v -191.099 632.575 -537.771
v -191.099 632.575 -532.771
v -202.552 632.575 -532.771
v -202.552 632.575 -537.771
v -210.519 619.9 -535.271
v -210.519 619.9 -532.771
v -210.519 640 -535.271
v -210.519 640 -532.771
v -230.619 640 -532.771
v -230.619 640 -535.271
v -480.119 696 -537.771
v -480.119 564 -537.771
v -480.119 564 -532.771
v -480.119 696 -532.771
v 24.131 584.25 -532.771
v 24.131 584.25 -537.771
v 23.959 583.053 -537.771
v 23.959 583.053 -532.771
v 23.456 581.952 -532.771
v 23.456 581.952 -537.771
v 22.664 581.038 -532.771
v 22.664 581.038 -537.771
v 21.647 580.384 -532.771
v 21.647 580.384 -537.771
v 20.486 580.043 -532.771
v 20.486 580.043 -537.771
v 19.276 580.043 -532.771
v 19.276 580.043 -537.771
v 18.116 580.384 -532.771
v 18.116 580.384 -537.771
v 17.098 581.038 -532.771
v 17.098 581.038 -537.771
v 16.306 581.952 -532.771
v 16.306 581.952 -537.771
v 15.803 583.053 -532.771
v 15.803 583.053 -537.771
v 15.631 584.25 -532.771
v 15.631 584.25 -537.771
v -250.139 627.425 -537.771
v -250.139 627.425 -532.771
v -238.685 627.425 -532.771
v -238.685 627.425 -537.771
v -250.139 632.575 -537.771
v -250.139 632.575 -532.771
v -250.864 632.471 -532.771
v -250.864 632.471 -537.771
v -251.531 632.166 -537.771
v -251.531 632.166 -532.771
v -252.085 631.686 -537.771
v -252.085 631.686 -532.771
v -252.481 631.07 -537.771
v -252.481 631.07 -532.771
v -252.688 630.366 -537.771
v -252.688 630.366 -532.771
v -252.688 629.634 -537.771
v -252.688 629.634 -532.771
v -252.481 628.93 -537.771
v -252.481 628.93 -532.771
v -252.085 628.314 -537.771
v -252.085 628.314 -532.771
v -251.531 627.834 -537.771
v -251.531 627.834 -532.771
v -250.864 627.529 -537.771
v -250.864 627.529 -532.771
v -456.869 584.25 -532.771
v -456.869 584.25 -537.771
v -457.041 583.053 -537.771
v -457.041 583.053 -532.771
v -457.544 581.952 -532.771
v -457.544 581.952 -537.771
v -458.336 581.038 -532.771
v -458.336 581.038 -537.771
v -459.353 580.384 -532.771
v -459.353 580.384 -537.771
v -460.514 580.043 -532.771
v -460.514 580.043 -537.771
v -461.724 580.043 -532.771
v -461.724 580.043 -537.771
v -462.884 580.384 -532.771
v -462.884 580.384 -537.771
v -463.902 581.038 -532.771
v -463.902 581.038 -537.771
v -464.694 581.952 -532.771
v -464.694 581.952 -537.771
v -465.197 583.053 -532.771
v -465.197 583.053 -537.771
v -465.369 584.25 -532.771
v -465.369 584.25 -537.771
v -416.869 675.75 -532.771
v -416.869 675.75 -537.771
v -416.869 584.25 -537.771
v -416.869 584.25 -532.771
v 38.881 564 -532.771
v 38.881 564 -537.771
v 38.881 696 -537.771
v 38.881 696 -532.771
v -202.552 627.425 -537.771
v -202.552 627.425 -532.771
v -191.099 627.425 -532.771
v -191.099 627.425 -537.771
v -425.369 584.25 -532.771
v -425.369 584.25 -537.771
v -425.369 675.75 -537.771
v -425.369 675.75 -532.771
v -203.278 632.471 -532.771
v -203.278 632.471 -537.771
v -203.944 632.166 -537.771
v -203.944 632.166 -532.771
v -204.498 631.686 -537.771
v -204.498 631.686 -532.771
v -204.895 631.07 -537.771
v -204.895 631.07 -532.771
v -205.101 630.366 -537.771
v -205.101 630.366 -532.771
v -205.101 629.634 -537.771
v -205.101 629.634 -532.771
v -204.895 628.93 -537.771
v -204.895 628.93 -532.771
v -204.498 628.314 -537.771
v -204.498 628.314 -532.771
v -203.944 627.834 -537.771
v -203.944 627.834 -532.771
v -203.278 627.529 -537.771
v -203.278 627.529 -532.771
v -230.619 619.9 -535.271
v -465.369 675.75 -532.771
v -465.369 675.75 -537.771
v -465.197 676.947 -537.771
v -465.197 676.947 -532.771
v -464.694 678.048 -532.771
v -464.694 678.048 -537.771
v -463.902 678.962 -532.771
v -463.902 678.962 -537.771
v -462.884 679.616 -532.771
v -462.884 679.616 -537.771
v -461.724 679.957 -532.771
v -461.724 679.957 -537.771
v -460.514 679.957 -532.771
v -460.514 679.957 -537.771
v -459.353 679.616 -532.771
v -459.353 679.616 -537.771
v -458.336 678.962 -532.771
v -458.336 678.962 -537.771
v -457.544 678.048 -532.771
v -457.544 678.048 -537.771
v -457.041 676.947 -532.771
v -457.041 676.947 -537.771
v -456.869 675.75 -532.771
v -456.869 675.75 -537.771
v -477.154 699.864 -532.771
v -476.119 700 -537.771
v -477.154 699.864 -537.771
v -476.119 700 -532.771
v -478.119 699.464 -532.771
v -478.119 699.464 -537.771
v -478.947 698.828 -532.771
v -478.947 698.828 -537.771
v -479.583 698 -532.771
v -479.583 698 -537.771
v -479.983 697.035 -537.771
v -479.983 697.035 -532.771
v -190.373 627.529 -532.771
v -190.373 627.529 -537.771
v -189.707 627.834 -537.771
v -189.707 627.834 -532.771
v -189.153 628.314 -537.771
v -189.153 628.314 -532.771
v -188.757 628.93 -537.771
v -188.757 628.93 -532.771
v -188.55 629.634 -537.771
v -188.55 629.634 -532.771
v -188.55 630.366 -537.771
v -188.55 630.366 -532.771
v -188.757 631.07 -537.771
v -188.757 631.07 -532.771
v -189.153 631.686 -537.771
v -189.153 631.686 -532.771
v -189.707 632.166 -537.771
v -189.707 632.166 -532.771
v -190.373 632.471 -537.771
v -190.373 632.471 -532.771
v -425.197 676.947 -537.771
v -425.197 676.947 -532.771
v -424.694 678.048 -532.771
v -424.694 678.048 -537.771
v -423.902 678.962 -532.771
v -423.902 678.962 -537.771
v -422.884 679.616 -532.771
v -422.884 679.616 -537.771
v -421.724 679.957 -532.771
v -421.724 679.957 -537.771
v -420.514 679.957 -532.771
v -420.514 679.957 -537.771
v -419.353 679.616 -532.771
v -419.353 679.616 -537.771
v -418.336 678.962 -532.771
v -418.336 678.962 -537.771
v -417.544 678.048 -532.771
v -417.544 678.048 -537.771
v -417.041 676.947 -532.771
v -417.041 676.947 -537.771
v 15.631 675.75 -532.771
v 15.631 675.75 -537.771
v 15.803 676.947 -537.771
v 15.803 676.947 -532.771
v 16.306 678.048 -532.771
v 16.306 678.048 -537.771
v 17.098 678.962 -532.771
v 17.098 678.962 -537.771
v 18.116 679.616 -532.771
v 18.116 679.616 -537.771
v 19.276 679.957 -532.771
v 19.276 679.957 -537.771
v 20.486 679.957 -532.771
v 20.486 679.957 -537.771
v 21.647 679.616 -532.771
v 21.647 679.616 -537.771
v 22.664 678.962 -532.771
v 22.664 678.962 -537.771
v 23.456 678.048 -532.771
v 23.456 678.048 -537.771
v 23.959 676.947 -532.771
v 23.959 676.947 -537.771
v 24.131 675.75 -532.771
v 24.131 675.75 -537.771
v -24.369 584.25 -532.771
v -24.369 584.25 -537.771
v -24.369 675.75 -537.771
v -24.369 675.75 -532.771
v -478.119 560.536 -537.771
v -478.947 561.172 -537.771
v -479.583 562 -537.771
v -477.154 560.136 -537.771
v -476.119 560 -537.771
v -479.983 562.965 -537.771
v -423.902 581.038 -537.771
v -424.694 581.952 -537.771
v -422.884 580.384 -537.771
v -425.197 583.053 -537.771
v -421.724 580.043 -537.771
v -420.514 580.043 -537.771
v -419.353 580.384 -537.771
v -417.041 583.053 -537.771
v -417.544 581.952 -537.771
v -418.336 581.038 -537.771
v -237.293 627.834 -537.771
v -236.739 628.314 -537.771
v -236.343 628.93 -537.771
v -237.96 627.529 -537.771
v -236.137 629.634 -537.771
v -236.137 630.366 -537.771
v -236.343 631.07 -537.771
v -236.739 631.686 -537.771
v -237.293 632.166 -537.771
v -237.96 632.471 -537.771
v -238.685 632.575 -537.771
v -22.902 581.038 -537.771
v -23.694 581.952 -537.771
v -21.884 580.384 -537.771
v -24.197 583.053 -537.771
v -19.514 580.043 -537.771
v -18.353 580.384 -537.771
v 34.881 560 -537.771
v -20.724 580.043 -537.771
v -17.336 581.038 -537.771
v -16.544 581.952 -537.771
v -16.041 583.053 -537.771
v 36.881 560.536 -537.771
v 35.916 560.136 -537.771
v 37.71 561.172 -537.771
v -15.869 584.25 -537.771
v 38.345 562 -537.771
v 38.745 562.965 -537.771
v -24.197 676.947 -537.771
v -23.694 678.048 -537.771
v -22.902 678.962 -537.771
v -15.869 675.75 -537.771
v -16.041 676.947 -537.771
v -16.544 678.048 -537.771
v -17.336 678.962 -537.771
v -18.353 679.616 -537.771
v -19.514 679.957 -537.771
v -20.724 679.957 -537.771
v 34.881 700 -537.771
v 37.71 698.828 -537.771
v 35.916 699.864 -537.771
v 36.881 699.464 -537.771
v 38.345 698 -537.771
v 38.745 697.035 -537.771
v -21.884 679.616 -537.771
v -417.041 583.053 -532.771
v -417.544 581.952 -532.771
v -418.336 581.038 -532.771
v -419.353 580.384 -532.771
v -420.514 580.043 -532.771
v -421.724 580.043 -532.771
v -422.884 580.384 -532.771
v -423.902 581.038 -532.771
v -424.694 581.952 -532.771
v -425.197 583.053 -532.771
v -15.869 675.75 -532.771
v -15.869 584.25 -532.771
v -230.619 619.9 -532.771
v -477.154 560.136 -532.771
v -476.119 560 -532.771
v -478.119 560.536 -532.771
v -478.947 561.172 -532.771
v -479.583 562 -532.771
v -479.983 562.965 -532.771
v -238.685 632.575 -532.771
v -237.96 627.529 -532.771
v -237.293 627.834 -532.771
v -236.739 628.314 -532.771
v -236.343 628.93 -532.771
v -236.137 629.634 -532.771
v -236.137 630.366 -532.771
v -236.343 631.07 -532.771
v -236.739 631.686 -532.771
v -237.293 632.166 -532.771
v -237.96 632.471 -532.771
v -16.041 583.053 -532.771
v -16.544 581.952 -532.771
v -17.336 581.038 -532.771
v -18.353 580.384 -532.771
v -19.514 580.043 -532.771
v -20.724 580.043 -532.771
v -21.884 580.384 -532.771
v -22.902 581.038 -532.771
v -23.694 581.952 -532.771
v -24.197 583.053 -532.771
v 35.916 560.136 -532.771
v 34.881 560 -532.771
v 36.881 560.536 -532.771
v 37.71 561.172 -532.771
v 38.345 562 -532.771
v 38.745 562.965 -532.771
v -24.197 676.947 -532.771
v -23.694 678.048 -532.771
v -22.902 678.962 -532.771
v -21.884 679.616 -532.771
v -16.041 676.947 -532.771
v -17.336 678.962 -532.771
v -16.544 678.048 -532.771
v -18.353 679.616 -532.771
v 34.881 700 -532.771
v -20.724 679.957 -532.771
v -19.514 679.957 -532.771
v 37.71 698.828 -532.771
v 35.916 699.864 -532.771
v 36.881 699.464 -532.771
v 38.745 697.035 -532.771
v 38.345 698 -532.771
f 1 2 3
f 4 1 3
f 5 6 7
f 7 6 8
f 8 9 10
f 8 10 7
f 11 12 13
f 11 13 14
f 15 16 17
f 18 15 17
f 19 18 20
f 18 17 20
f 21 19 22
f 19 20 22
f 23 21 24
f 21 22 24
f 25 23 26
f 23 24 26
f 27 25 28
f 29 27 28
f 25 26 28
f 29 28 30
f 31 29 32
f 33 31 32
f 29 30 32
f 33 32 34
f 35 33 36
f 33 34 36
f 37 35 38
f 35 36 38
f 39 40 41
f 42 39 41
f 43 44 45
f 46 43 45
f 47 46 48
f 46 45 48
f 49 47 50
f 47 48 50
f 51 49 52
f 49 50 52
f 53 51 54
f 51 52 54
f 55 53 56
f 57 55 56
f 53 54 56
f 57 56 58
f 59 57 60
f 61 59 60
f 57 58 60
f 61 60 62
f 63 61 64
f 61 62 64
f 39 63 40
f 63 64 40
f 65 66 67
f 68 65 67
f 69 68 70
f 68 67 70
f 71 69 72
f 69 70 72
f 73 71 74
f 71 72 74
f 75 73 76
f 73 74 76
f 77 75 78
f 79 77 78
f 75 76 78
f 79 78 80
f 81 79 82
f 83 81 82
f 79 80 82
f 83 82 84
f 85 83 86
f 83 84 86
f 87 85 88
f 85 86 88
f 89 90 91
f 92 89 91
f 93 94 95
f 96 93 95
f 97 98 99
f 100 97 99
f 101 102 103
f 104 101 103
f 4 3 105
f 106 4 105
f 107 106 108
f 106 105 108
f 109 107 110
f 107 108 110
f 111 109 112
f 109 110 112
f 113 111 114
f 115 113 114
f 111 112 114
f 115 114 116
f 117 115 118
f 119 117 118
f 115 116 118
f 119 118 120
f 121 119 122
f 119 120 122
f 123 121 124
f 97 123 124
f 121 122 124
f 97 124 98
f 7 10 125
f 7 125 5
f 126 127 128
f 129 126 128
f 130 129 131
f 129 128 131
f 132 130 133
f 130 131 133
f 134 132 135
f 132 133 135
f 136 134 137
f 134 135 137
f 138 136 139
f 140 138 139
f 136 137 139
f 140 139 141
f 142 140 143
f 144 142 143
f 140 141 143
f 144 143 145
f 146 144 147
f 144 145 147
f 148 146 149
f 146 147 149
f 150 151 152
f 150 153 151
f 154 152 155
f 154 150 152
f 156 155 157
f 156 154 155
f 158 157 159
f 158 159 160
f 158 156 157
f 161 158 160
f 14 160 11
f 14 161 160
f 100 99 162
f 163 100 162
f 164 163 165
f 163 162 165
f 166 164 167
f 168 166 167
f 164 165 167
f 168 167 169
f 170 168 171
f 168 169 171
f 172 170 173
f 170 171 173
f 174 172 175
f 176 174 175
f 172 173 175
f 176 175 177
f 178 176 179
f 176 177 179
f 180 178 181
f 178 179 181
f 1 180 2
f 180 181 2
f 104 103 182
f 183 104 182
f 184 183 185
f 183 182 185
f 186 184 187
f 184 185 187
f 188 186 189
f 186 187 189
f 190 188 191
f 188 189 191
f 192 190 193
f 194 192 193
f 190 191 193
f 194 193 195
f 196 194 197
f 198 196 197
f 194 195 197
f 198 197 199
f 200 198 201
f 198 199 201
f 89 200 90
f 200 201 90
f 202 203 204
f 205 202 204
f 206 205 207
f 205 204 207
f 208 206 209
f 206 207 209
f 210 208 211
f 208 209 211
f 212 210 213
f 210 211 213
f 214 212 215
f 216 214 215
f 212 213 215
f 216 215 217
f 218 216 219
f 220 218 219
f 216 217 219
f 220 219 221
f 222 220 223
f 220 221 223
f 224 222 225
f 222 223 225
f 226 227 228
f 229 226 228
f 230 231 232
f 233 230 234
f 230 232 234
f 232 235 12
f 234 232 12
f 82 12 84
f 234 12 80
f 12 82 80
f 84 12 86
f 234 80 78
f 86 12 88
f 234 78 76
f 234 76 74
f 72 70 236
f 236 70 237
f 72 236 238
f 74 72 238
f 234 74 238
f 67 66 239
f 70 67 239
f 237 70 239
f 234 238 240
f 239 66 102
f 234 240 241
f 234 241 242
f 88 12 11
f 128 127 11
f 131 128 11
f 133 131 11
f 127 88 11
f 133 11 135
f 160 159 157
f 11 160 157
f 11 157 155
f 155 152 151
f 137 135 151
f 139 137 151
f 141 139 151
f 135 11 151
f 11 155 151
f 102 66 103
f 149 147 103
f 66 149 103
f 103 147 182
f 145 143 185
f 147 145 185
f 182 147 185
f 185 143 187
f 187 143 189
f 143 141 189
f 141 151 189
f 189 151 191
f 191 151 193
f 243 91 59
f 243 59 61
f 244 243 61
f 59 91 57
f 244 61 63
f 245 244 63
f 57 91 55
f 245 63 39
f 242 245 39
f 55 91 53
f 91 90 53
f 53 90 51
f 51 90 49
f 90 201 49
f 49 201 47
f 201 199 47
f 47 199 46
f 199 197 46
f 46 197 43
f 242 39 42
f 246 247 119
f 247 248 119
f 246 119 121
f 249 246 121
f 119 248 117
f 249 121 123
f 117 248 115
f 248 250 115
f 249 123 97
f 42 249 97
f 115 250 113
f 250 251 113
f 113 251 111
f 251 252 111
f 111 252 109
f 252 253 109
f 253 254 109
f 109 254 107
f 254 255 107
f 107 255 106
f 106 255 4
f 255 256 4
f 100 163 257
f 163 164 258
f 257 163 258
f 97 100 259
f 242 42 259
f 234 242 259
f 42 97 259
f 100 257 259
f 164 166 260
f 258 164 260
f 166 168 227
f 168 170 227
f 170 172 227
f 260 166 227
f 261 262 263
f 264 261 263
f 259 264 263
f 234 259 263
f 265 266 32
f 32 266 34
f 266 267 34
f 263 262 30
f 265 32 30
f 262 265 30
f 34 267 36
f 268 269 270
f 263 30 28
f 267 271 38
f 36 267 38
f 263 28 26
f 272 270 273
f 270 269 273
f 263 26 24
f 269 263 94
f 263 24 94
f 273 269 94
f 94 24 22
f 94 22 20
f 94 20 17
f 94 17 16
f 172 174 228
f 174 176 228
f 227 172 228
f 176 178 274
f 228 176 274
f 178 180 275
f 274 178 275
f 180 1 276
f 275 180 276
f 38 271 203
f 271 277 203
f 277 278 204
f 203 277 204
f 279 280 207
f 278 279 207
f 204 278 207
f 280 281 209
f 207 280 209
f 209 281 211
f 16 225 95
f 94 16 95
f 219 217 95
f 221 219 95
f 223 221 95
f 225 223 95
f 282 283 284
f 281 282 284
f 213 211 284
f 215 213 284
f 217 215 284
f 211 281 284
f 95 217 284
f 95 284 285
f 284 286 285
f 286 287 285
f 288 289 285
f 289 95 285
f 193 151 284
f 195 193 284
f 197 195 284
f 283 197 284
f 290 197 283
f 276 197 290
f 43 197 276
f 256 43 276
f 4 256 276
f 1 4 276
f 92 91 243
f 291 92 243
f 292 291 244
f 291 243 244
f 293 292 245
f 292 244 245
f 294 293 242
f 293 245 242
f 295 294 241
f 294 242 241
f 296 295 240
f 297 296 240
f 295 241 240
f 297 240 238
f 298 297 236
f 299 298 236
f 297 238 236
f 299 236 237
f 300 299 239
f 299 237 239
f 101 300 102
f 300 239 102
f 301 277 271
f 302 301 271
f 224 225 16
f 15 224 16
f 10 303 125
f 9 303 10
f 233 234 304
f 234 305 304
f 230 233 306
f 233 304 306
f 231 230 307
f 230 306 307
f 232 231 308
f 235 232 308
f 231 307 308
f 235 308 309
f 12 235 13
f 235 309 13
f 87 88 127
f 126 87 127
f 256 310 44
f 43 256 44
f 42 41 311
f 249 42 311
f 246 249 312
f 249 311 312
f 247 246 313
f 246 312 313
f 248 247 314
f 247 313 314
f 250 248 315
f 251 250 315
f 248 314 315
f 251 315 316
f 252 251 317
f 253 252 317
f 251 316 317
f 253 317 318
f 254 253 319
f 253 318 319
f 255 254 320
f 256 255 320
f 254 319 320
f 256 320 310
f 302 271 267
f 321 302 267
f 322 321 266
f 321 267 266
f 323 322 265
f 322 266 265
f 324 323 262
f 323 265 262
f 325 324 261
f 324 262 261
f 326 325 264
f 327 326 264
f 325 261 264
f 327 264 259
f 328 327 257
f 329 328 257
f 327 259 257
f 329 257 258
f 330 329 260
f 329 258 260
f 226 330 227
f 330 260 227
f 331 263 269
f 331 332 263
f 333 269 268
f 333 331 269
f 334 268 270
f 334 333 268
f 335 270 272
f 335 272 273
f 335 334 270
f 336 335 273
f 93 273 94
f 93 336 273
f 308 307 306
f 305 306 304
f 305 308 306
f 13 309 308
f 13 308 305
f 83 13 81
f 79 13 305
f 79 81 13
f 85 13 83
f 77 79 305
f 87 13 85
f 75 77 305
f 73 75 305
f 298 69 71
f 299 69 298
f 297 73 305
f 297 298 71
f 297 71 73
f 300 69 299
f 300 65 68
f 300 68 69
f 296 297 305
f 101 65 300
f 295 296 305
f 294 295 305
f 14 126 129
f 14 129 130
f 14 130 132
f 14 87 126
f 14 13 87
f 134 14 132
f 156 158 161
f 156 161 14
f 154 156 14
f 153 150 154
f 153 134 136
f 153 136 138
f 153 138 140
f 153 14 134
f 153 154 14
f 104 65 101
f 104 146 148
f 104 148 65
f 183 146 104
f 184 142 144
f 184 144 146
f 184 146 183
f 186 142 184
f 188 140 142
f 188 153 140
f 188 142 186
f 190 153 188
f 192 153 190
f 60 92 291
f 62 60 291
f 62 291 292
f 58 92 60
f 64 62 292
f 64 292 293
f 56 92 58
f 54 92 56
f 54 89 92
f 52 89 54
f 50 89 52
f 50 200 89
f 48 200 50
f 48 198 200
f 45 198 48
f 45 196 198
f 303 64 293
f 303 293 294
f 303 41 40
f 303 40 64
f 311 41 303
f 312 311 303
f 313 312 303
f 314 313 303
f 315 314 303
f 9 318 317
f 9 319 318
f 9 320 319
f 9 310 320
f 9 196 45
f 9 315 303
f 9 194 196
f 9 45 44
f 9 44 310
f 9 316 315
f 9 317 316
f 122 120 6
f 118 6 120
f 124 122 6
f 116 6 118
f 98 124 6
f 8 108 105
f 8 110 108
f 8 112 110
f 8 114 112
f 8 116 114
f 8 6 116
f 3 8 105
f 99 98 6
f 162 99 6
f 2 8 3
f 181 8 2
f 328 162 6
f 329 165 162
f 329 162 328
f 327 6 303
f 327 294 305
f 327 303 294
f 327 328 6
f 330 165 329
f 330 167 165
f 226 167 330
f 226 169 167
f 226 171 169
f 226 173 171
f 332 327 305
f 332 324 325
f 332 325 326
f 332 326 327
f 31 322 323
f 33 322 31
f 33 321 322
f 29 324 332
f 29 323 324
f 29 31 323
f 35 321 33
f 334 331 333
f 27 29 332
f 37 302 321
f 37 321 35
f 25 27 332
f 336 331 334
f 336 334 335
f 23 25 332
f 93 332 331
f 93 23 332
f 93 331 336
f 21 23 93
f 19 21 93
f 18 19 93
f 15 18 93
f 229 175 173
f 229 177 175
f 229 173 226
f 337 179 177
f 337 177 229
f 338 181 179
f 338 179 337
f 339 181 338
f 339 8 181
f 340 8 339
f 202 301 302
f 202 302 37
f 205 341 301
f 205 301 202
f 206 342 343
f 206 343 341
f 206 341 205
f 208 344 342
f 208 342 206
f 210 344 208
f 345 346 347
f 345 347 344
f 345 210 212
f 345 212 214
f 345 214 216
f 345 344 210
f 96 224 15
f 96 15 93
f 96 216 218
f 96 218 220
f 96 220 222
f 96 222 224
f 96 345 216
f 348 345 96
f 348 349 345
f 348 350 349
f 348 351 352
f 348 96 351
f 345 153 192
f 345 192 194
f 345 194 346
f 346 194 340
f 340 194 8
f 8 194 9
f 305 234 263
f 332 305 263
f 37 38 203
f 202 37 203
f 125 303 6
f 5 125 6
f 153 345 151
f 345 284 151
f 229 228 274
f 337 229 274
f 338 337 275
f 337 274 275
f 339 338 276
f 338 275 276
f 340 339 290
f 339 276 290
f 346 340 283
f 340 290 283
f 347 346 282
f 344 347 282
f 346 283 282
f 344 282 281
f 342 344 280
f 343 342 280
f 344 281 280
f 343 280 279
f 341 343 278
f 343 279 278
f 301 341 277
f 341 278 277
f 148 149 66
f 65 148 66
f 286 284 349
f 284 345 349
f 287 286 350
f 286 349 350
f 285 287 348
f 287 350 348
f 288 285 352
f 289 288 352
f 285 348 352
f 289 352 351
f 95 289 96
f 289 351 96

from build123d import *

# Parameters (mm, degrees)
SKETCH2_W           = 465.25
SKETCH2_H           = 140
SKETCH2_W_2         = 29.5
BOSS_EXTRUDE3_DEPTH = 5
FILLET1_R           = 4
SKETCH5_W           = 20.1
SKETCH5_H           = 20.1
CUT_EXTRUDE1_DEPTH  = 2.5
CUT_EXTRUDE2_DEPTH  = 10


with BuildPart() as part:
    # Sketch2 → Boss-Extrude3 (new body)
    # profile 1 of 3: a face of its own
    with BuildSketch(Plane.XY.offset(-537.770775127)):
        with Locations((-247.493842126, 630)):
            Rectangle(SKETCH2_W, SKETCH2_H)
        with BuildLine():
            Line((-456.868842126, 675.75), (-456.868842126, 584.25))
            ThreePointArc((-456.868842126, 584.25), (-461.118842126, 580), (-465.368842126, 584.25))
            Line((-465.368842126, 584.25), (-465.368842126, 675.75))
            ThreePointArc((-465.368842126, 675.75), (-461.118842126, 680), (-456.868842126, 675.75))
        make_face(mode=Mode.SUBTRACT)
        with BuildLine():
            ThreePointArc((-416.868842126, 584.25), (-421.118842126, 580), (-425.368842126, 584.25))
            Line((-425.368842126, 584.25), (-425.368842126, 675.75))
            ThreePointArc((-425.368842126, 675.75), (-421.118842126, 680), (-416.868842126, 675.75))
            Line((-416.868842126, 675.75), (-416.868842126, 584.25))
        make_face(mode=Mode.SUBTRACT)
        with BuildLine():
            Line((-15.868842127, 675.75), (-15.868842127, 584.25))
            ThreePointArc((-15.868842127, 584.25), (-20.118842127, 580), (-24.368842127, 584.25))
            Line((-24.368842127, 584.25), (-24.368842127, 675.75))
            ThreePointArc((-24.368842127, 675.75), (-20.118842127, 680), (-15.868842127, 675.75))
        make_face(mode=Mode.SUBTRACT)
    # profile 2 of 3: a face of its own
    with BuildSketch(Plane.XY.offset(-537.770775127)):
        with Locations((-0.118842126, 630)):
            Rectangle(SKETCH2_W_2, SKETCH2_H)
    # profile 3 of 3: a face of its own
    with BuildSketch(Plane.XY.offset(-537.770775127)):
        Polygon((15.631157874, 700), (14.631157874, 700), (14.631157874, 560), (38.881157874, 560), (38.881157874, 700), (24.131157874, 700), align=None)
        with BuildLine():
            ThreePointArc((24.131157874, 584.25), (19.881157874, 580), (15.631157874, 584.25))
            Line((15.631157874, 584.25), (15.631157874, 675.75))
            ThreePointArc((15.631157874, 675.75), (19.881157874, 680), (24.131157874, 675.75))
            Line((24.131157874, 675.75), (24.131157874, 584.25))
        make_face(mode=Mode.SUBTRACT)
    extrude(amount=BOSS_EXTRUDE3_DEPTH)

    # Fillet1
    fillet1_edges = [part.edges().sort_by_distance(p)[0] for p in [
        (-480.118842126, 700, -535.270775127),
        (38.881157874, 700, -535.270775127),
        (38.881157874, 560, -535.270775127),
        (-480.118842126, 560, -535.270775127),
    ]]
    fillet(fillet1_edges, radius=FILLET1_R)

    # Sketch5 → Cut-Extrude1 (cut)
    with BuildSketch(Plane.XY.offset(-532.770775127)):
        with Locations((-220.568842126, 629.95)):
            Rectangle(SKETCH5_W, SKETCH5_H)
    extrude(amount=-CUT_EXTRUDE1_DEPTH, mode=Mode.SUBTRACT)

    # Sketch6 → Cut-Extrude2 (cut)
    with BuildSketch(Plane.XY.offset(-532.770775127)):
        with BuildLine():
            Line((-191.098842126, 632.575), (-202.552234041, 632.575))
            ThreePointArc((-202.552234041, 632.575), (-205.127234041, 630), (-202.552234041, 627.425))
            Line((-202.552234041, 627.425), (-191.098842126, 627.425))
            ThreePointArc((-191.098842126, 627.425), (-188.523842126, 630), (-191.098842126, 632.575))
        make_face()
        with BuildLine():
            Line((-250.138842126, 627.425), (-238.685450212, 627.425))
            ThreePointArc((-238.685450212, 627.425), (-236.110450212, 630), (-238.685450212, 632.575))
            Line((-238.685450212, 632.575), (-250.138842126, 632.575))
            ThreePointArc((-250.138842126, 632.575), (-252.713842126, 630), (-250.138842126, 627.425))
        make_face()
    extrude(amount=-CUT_EXTRUDE2_DEPTH, mode=Mode.SUBTRACT)


solid = part.part
